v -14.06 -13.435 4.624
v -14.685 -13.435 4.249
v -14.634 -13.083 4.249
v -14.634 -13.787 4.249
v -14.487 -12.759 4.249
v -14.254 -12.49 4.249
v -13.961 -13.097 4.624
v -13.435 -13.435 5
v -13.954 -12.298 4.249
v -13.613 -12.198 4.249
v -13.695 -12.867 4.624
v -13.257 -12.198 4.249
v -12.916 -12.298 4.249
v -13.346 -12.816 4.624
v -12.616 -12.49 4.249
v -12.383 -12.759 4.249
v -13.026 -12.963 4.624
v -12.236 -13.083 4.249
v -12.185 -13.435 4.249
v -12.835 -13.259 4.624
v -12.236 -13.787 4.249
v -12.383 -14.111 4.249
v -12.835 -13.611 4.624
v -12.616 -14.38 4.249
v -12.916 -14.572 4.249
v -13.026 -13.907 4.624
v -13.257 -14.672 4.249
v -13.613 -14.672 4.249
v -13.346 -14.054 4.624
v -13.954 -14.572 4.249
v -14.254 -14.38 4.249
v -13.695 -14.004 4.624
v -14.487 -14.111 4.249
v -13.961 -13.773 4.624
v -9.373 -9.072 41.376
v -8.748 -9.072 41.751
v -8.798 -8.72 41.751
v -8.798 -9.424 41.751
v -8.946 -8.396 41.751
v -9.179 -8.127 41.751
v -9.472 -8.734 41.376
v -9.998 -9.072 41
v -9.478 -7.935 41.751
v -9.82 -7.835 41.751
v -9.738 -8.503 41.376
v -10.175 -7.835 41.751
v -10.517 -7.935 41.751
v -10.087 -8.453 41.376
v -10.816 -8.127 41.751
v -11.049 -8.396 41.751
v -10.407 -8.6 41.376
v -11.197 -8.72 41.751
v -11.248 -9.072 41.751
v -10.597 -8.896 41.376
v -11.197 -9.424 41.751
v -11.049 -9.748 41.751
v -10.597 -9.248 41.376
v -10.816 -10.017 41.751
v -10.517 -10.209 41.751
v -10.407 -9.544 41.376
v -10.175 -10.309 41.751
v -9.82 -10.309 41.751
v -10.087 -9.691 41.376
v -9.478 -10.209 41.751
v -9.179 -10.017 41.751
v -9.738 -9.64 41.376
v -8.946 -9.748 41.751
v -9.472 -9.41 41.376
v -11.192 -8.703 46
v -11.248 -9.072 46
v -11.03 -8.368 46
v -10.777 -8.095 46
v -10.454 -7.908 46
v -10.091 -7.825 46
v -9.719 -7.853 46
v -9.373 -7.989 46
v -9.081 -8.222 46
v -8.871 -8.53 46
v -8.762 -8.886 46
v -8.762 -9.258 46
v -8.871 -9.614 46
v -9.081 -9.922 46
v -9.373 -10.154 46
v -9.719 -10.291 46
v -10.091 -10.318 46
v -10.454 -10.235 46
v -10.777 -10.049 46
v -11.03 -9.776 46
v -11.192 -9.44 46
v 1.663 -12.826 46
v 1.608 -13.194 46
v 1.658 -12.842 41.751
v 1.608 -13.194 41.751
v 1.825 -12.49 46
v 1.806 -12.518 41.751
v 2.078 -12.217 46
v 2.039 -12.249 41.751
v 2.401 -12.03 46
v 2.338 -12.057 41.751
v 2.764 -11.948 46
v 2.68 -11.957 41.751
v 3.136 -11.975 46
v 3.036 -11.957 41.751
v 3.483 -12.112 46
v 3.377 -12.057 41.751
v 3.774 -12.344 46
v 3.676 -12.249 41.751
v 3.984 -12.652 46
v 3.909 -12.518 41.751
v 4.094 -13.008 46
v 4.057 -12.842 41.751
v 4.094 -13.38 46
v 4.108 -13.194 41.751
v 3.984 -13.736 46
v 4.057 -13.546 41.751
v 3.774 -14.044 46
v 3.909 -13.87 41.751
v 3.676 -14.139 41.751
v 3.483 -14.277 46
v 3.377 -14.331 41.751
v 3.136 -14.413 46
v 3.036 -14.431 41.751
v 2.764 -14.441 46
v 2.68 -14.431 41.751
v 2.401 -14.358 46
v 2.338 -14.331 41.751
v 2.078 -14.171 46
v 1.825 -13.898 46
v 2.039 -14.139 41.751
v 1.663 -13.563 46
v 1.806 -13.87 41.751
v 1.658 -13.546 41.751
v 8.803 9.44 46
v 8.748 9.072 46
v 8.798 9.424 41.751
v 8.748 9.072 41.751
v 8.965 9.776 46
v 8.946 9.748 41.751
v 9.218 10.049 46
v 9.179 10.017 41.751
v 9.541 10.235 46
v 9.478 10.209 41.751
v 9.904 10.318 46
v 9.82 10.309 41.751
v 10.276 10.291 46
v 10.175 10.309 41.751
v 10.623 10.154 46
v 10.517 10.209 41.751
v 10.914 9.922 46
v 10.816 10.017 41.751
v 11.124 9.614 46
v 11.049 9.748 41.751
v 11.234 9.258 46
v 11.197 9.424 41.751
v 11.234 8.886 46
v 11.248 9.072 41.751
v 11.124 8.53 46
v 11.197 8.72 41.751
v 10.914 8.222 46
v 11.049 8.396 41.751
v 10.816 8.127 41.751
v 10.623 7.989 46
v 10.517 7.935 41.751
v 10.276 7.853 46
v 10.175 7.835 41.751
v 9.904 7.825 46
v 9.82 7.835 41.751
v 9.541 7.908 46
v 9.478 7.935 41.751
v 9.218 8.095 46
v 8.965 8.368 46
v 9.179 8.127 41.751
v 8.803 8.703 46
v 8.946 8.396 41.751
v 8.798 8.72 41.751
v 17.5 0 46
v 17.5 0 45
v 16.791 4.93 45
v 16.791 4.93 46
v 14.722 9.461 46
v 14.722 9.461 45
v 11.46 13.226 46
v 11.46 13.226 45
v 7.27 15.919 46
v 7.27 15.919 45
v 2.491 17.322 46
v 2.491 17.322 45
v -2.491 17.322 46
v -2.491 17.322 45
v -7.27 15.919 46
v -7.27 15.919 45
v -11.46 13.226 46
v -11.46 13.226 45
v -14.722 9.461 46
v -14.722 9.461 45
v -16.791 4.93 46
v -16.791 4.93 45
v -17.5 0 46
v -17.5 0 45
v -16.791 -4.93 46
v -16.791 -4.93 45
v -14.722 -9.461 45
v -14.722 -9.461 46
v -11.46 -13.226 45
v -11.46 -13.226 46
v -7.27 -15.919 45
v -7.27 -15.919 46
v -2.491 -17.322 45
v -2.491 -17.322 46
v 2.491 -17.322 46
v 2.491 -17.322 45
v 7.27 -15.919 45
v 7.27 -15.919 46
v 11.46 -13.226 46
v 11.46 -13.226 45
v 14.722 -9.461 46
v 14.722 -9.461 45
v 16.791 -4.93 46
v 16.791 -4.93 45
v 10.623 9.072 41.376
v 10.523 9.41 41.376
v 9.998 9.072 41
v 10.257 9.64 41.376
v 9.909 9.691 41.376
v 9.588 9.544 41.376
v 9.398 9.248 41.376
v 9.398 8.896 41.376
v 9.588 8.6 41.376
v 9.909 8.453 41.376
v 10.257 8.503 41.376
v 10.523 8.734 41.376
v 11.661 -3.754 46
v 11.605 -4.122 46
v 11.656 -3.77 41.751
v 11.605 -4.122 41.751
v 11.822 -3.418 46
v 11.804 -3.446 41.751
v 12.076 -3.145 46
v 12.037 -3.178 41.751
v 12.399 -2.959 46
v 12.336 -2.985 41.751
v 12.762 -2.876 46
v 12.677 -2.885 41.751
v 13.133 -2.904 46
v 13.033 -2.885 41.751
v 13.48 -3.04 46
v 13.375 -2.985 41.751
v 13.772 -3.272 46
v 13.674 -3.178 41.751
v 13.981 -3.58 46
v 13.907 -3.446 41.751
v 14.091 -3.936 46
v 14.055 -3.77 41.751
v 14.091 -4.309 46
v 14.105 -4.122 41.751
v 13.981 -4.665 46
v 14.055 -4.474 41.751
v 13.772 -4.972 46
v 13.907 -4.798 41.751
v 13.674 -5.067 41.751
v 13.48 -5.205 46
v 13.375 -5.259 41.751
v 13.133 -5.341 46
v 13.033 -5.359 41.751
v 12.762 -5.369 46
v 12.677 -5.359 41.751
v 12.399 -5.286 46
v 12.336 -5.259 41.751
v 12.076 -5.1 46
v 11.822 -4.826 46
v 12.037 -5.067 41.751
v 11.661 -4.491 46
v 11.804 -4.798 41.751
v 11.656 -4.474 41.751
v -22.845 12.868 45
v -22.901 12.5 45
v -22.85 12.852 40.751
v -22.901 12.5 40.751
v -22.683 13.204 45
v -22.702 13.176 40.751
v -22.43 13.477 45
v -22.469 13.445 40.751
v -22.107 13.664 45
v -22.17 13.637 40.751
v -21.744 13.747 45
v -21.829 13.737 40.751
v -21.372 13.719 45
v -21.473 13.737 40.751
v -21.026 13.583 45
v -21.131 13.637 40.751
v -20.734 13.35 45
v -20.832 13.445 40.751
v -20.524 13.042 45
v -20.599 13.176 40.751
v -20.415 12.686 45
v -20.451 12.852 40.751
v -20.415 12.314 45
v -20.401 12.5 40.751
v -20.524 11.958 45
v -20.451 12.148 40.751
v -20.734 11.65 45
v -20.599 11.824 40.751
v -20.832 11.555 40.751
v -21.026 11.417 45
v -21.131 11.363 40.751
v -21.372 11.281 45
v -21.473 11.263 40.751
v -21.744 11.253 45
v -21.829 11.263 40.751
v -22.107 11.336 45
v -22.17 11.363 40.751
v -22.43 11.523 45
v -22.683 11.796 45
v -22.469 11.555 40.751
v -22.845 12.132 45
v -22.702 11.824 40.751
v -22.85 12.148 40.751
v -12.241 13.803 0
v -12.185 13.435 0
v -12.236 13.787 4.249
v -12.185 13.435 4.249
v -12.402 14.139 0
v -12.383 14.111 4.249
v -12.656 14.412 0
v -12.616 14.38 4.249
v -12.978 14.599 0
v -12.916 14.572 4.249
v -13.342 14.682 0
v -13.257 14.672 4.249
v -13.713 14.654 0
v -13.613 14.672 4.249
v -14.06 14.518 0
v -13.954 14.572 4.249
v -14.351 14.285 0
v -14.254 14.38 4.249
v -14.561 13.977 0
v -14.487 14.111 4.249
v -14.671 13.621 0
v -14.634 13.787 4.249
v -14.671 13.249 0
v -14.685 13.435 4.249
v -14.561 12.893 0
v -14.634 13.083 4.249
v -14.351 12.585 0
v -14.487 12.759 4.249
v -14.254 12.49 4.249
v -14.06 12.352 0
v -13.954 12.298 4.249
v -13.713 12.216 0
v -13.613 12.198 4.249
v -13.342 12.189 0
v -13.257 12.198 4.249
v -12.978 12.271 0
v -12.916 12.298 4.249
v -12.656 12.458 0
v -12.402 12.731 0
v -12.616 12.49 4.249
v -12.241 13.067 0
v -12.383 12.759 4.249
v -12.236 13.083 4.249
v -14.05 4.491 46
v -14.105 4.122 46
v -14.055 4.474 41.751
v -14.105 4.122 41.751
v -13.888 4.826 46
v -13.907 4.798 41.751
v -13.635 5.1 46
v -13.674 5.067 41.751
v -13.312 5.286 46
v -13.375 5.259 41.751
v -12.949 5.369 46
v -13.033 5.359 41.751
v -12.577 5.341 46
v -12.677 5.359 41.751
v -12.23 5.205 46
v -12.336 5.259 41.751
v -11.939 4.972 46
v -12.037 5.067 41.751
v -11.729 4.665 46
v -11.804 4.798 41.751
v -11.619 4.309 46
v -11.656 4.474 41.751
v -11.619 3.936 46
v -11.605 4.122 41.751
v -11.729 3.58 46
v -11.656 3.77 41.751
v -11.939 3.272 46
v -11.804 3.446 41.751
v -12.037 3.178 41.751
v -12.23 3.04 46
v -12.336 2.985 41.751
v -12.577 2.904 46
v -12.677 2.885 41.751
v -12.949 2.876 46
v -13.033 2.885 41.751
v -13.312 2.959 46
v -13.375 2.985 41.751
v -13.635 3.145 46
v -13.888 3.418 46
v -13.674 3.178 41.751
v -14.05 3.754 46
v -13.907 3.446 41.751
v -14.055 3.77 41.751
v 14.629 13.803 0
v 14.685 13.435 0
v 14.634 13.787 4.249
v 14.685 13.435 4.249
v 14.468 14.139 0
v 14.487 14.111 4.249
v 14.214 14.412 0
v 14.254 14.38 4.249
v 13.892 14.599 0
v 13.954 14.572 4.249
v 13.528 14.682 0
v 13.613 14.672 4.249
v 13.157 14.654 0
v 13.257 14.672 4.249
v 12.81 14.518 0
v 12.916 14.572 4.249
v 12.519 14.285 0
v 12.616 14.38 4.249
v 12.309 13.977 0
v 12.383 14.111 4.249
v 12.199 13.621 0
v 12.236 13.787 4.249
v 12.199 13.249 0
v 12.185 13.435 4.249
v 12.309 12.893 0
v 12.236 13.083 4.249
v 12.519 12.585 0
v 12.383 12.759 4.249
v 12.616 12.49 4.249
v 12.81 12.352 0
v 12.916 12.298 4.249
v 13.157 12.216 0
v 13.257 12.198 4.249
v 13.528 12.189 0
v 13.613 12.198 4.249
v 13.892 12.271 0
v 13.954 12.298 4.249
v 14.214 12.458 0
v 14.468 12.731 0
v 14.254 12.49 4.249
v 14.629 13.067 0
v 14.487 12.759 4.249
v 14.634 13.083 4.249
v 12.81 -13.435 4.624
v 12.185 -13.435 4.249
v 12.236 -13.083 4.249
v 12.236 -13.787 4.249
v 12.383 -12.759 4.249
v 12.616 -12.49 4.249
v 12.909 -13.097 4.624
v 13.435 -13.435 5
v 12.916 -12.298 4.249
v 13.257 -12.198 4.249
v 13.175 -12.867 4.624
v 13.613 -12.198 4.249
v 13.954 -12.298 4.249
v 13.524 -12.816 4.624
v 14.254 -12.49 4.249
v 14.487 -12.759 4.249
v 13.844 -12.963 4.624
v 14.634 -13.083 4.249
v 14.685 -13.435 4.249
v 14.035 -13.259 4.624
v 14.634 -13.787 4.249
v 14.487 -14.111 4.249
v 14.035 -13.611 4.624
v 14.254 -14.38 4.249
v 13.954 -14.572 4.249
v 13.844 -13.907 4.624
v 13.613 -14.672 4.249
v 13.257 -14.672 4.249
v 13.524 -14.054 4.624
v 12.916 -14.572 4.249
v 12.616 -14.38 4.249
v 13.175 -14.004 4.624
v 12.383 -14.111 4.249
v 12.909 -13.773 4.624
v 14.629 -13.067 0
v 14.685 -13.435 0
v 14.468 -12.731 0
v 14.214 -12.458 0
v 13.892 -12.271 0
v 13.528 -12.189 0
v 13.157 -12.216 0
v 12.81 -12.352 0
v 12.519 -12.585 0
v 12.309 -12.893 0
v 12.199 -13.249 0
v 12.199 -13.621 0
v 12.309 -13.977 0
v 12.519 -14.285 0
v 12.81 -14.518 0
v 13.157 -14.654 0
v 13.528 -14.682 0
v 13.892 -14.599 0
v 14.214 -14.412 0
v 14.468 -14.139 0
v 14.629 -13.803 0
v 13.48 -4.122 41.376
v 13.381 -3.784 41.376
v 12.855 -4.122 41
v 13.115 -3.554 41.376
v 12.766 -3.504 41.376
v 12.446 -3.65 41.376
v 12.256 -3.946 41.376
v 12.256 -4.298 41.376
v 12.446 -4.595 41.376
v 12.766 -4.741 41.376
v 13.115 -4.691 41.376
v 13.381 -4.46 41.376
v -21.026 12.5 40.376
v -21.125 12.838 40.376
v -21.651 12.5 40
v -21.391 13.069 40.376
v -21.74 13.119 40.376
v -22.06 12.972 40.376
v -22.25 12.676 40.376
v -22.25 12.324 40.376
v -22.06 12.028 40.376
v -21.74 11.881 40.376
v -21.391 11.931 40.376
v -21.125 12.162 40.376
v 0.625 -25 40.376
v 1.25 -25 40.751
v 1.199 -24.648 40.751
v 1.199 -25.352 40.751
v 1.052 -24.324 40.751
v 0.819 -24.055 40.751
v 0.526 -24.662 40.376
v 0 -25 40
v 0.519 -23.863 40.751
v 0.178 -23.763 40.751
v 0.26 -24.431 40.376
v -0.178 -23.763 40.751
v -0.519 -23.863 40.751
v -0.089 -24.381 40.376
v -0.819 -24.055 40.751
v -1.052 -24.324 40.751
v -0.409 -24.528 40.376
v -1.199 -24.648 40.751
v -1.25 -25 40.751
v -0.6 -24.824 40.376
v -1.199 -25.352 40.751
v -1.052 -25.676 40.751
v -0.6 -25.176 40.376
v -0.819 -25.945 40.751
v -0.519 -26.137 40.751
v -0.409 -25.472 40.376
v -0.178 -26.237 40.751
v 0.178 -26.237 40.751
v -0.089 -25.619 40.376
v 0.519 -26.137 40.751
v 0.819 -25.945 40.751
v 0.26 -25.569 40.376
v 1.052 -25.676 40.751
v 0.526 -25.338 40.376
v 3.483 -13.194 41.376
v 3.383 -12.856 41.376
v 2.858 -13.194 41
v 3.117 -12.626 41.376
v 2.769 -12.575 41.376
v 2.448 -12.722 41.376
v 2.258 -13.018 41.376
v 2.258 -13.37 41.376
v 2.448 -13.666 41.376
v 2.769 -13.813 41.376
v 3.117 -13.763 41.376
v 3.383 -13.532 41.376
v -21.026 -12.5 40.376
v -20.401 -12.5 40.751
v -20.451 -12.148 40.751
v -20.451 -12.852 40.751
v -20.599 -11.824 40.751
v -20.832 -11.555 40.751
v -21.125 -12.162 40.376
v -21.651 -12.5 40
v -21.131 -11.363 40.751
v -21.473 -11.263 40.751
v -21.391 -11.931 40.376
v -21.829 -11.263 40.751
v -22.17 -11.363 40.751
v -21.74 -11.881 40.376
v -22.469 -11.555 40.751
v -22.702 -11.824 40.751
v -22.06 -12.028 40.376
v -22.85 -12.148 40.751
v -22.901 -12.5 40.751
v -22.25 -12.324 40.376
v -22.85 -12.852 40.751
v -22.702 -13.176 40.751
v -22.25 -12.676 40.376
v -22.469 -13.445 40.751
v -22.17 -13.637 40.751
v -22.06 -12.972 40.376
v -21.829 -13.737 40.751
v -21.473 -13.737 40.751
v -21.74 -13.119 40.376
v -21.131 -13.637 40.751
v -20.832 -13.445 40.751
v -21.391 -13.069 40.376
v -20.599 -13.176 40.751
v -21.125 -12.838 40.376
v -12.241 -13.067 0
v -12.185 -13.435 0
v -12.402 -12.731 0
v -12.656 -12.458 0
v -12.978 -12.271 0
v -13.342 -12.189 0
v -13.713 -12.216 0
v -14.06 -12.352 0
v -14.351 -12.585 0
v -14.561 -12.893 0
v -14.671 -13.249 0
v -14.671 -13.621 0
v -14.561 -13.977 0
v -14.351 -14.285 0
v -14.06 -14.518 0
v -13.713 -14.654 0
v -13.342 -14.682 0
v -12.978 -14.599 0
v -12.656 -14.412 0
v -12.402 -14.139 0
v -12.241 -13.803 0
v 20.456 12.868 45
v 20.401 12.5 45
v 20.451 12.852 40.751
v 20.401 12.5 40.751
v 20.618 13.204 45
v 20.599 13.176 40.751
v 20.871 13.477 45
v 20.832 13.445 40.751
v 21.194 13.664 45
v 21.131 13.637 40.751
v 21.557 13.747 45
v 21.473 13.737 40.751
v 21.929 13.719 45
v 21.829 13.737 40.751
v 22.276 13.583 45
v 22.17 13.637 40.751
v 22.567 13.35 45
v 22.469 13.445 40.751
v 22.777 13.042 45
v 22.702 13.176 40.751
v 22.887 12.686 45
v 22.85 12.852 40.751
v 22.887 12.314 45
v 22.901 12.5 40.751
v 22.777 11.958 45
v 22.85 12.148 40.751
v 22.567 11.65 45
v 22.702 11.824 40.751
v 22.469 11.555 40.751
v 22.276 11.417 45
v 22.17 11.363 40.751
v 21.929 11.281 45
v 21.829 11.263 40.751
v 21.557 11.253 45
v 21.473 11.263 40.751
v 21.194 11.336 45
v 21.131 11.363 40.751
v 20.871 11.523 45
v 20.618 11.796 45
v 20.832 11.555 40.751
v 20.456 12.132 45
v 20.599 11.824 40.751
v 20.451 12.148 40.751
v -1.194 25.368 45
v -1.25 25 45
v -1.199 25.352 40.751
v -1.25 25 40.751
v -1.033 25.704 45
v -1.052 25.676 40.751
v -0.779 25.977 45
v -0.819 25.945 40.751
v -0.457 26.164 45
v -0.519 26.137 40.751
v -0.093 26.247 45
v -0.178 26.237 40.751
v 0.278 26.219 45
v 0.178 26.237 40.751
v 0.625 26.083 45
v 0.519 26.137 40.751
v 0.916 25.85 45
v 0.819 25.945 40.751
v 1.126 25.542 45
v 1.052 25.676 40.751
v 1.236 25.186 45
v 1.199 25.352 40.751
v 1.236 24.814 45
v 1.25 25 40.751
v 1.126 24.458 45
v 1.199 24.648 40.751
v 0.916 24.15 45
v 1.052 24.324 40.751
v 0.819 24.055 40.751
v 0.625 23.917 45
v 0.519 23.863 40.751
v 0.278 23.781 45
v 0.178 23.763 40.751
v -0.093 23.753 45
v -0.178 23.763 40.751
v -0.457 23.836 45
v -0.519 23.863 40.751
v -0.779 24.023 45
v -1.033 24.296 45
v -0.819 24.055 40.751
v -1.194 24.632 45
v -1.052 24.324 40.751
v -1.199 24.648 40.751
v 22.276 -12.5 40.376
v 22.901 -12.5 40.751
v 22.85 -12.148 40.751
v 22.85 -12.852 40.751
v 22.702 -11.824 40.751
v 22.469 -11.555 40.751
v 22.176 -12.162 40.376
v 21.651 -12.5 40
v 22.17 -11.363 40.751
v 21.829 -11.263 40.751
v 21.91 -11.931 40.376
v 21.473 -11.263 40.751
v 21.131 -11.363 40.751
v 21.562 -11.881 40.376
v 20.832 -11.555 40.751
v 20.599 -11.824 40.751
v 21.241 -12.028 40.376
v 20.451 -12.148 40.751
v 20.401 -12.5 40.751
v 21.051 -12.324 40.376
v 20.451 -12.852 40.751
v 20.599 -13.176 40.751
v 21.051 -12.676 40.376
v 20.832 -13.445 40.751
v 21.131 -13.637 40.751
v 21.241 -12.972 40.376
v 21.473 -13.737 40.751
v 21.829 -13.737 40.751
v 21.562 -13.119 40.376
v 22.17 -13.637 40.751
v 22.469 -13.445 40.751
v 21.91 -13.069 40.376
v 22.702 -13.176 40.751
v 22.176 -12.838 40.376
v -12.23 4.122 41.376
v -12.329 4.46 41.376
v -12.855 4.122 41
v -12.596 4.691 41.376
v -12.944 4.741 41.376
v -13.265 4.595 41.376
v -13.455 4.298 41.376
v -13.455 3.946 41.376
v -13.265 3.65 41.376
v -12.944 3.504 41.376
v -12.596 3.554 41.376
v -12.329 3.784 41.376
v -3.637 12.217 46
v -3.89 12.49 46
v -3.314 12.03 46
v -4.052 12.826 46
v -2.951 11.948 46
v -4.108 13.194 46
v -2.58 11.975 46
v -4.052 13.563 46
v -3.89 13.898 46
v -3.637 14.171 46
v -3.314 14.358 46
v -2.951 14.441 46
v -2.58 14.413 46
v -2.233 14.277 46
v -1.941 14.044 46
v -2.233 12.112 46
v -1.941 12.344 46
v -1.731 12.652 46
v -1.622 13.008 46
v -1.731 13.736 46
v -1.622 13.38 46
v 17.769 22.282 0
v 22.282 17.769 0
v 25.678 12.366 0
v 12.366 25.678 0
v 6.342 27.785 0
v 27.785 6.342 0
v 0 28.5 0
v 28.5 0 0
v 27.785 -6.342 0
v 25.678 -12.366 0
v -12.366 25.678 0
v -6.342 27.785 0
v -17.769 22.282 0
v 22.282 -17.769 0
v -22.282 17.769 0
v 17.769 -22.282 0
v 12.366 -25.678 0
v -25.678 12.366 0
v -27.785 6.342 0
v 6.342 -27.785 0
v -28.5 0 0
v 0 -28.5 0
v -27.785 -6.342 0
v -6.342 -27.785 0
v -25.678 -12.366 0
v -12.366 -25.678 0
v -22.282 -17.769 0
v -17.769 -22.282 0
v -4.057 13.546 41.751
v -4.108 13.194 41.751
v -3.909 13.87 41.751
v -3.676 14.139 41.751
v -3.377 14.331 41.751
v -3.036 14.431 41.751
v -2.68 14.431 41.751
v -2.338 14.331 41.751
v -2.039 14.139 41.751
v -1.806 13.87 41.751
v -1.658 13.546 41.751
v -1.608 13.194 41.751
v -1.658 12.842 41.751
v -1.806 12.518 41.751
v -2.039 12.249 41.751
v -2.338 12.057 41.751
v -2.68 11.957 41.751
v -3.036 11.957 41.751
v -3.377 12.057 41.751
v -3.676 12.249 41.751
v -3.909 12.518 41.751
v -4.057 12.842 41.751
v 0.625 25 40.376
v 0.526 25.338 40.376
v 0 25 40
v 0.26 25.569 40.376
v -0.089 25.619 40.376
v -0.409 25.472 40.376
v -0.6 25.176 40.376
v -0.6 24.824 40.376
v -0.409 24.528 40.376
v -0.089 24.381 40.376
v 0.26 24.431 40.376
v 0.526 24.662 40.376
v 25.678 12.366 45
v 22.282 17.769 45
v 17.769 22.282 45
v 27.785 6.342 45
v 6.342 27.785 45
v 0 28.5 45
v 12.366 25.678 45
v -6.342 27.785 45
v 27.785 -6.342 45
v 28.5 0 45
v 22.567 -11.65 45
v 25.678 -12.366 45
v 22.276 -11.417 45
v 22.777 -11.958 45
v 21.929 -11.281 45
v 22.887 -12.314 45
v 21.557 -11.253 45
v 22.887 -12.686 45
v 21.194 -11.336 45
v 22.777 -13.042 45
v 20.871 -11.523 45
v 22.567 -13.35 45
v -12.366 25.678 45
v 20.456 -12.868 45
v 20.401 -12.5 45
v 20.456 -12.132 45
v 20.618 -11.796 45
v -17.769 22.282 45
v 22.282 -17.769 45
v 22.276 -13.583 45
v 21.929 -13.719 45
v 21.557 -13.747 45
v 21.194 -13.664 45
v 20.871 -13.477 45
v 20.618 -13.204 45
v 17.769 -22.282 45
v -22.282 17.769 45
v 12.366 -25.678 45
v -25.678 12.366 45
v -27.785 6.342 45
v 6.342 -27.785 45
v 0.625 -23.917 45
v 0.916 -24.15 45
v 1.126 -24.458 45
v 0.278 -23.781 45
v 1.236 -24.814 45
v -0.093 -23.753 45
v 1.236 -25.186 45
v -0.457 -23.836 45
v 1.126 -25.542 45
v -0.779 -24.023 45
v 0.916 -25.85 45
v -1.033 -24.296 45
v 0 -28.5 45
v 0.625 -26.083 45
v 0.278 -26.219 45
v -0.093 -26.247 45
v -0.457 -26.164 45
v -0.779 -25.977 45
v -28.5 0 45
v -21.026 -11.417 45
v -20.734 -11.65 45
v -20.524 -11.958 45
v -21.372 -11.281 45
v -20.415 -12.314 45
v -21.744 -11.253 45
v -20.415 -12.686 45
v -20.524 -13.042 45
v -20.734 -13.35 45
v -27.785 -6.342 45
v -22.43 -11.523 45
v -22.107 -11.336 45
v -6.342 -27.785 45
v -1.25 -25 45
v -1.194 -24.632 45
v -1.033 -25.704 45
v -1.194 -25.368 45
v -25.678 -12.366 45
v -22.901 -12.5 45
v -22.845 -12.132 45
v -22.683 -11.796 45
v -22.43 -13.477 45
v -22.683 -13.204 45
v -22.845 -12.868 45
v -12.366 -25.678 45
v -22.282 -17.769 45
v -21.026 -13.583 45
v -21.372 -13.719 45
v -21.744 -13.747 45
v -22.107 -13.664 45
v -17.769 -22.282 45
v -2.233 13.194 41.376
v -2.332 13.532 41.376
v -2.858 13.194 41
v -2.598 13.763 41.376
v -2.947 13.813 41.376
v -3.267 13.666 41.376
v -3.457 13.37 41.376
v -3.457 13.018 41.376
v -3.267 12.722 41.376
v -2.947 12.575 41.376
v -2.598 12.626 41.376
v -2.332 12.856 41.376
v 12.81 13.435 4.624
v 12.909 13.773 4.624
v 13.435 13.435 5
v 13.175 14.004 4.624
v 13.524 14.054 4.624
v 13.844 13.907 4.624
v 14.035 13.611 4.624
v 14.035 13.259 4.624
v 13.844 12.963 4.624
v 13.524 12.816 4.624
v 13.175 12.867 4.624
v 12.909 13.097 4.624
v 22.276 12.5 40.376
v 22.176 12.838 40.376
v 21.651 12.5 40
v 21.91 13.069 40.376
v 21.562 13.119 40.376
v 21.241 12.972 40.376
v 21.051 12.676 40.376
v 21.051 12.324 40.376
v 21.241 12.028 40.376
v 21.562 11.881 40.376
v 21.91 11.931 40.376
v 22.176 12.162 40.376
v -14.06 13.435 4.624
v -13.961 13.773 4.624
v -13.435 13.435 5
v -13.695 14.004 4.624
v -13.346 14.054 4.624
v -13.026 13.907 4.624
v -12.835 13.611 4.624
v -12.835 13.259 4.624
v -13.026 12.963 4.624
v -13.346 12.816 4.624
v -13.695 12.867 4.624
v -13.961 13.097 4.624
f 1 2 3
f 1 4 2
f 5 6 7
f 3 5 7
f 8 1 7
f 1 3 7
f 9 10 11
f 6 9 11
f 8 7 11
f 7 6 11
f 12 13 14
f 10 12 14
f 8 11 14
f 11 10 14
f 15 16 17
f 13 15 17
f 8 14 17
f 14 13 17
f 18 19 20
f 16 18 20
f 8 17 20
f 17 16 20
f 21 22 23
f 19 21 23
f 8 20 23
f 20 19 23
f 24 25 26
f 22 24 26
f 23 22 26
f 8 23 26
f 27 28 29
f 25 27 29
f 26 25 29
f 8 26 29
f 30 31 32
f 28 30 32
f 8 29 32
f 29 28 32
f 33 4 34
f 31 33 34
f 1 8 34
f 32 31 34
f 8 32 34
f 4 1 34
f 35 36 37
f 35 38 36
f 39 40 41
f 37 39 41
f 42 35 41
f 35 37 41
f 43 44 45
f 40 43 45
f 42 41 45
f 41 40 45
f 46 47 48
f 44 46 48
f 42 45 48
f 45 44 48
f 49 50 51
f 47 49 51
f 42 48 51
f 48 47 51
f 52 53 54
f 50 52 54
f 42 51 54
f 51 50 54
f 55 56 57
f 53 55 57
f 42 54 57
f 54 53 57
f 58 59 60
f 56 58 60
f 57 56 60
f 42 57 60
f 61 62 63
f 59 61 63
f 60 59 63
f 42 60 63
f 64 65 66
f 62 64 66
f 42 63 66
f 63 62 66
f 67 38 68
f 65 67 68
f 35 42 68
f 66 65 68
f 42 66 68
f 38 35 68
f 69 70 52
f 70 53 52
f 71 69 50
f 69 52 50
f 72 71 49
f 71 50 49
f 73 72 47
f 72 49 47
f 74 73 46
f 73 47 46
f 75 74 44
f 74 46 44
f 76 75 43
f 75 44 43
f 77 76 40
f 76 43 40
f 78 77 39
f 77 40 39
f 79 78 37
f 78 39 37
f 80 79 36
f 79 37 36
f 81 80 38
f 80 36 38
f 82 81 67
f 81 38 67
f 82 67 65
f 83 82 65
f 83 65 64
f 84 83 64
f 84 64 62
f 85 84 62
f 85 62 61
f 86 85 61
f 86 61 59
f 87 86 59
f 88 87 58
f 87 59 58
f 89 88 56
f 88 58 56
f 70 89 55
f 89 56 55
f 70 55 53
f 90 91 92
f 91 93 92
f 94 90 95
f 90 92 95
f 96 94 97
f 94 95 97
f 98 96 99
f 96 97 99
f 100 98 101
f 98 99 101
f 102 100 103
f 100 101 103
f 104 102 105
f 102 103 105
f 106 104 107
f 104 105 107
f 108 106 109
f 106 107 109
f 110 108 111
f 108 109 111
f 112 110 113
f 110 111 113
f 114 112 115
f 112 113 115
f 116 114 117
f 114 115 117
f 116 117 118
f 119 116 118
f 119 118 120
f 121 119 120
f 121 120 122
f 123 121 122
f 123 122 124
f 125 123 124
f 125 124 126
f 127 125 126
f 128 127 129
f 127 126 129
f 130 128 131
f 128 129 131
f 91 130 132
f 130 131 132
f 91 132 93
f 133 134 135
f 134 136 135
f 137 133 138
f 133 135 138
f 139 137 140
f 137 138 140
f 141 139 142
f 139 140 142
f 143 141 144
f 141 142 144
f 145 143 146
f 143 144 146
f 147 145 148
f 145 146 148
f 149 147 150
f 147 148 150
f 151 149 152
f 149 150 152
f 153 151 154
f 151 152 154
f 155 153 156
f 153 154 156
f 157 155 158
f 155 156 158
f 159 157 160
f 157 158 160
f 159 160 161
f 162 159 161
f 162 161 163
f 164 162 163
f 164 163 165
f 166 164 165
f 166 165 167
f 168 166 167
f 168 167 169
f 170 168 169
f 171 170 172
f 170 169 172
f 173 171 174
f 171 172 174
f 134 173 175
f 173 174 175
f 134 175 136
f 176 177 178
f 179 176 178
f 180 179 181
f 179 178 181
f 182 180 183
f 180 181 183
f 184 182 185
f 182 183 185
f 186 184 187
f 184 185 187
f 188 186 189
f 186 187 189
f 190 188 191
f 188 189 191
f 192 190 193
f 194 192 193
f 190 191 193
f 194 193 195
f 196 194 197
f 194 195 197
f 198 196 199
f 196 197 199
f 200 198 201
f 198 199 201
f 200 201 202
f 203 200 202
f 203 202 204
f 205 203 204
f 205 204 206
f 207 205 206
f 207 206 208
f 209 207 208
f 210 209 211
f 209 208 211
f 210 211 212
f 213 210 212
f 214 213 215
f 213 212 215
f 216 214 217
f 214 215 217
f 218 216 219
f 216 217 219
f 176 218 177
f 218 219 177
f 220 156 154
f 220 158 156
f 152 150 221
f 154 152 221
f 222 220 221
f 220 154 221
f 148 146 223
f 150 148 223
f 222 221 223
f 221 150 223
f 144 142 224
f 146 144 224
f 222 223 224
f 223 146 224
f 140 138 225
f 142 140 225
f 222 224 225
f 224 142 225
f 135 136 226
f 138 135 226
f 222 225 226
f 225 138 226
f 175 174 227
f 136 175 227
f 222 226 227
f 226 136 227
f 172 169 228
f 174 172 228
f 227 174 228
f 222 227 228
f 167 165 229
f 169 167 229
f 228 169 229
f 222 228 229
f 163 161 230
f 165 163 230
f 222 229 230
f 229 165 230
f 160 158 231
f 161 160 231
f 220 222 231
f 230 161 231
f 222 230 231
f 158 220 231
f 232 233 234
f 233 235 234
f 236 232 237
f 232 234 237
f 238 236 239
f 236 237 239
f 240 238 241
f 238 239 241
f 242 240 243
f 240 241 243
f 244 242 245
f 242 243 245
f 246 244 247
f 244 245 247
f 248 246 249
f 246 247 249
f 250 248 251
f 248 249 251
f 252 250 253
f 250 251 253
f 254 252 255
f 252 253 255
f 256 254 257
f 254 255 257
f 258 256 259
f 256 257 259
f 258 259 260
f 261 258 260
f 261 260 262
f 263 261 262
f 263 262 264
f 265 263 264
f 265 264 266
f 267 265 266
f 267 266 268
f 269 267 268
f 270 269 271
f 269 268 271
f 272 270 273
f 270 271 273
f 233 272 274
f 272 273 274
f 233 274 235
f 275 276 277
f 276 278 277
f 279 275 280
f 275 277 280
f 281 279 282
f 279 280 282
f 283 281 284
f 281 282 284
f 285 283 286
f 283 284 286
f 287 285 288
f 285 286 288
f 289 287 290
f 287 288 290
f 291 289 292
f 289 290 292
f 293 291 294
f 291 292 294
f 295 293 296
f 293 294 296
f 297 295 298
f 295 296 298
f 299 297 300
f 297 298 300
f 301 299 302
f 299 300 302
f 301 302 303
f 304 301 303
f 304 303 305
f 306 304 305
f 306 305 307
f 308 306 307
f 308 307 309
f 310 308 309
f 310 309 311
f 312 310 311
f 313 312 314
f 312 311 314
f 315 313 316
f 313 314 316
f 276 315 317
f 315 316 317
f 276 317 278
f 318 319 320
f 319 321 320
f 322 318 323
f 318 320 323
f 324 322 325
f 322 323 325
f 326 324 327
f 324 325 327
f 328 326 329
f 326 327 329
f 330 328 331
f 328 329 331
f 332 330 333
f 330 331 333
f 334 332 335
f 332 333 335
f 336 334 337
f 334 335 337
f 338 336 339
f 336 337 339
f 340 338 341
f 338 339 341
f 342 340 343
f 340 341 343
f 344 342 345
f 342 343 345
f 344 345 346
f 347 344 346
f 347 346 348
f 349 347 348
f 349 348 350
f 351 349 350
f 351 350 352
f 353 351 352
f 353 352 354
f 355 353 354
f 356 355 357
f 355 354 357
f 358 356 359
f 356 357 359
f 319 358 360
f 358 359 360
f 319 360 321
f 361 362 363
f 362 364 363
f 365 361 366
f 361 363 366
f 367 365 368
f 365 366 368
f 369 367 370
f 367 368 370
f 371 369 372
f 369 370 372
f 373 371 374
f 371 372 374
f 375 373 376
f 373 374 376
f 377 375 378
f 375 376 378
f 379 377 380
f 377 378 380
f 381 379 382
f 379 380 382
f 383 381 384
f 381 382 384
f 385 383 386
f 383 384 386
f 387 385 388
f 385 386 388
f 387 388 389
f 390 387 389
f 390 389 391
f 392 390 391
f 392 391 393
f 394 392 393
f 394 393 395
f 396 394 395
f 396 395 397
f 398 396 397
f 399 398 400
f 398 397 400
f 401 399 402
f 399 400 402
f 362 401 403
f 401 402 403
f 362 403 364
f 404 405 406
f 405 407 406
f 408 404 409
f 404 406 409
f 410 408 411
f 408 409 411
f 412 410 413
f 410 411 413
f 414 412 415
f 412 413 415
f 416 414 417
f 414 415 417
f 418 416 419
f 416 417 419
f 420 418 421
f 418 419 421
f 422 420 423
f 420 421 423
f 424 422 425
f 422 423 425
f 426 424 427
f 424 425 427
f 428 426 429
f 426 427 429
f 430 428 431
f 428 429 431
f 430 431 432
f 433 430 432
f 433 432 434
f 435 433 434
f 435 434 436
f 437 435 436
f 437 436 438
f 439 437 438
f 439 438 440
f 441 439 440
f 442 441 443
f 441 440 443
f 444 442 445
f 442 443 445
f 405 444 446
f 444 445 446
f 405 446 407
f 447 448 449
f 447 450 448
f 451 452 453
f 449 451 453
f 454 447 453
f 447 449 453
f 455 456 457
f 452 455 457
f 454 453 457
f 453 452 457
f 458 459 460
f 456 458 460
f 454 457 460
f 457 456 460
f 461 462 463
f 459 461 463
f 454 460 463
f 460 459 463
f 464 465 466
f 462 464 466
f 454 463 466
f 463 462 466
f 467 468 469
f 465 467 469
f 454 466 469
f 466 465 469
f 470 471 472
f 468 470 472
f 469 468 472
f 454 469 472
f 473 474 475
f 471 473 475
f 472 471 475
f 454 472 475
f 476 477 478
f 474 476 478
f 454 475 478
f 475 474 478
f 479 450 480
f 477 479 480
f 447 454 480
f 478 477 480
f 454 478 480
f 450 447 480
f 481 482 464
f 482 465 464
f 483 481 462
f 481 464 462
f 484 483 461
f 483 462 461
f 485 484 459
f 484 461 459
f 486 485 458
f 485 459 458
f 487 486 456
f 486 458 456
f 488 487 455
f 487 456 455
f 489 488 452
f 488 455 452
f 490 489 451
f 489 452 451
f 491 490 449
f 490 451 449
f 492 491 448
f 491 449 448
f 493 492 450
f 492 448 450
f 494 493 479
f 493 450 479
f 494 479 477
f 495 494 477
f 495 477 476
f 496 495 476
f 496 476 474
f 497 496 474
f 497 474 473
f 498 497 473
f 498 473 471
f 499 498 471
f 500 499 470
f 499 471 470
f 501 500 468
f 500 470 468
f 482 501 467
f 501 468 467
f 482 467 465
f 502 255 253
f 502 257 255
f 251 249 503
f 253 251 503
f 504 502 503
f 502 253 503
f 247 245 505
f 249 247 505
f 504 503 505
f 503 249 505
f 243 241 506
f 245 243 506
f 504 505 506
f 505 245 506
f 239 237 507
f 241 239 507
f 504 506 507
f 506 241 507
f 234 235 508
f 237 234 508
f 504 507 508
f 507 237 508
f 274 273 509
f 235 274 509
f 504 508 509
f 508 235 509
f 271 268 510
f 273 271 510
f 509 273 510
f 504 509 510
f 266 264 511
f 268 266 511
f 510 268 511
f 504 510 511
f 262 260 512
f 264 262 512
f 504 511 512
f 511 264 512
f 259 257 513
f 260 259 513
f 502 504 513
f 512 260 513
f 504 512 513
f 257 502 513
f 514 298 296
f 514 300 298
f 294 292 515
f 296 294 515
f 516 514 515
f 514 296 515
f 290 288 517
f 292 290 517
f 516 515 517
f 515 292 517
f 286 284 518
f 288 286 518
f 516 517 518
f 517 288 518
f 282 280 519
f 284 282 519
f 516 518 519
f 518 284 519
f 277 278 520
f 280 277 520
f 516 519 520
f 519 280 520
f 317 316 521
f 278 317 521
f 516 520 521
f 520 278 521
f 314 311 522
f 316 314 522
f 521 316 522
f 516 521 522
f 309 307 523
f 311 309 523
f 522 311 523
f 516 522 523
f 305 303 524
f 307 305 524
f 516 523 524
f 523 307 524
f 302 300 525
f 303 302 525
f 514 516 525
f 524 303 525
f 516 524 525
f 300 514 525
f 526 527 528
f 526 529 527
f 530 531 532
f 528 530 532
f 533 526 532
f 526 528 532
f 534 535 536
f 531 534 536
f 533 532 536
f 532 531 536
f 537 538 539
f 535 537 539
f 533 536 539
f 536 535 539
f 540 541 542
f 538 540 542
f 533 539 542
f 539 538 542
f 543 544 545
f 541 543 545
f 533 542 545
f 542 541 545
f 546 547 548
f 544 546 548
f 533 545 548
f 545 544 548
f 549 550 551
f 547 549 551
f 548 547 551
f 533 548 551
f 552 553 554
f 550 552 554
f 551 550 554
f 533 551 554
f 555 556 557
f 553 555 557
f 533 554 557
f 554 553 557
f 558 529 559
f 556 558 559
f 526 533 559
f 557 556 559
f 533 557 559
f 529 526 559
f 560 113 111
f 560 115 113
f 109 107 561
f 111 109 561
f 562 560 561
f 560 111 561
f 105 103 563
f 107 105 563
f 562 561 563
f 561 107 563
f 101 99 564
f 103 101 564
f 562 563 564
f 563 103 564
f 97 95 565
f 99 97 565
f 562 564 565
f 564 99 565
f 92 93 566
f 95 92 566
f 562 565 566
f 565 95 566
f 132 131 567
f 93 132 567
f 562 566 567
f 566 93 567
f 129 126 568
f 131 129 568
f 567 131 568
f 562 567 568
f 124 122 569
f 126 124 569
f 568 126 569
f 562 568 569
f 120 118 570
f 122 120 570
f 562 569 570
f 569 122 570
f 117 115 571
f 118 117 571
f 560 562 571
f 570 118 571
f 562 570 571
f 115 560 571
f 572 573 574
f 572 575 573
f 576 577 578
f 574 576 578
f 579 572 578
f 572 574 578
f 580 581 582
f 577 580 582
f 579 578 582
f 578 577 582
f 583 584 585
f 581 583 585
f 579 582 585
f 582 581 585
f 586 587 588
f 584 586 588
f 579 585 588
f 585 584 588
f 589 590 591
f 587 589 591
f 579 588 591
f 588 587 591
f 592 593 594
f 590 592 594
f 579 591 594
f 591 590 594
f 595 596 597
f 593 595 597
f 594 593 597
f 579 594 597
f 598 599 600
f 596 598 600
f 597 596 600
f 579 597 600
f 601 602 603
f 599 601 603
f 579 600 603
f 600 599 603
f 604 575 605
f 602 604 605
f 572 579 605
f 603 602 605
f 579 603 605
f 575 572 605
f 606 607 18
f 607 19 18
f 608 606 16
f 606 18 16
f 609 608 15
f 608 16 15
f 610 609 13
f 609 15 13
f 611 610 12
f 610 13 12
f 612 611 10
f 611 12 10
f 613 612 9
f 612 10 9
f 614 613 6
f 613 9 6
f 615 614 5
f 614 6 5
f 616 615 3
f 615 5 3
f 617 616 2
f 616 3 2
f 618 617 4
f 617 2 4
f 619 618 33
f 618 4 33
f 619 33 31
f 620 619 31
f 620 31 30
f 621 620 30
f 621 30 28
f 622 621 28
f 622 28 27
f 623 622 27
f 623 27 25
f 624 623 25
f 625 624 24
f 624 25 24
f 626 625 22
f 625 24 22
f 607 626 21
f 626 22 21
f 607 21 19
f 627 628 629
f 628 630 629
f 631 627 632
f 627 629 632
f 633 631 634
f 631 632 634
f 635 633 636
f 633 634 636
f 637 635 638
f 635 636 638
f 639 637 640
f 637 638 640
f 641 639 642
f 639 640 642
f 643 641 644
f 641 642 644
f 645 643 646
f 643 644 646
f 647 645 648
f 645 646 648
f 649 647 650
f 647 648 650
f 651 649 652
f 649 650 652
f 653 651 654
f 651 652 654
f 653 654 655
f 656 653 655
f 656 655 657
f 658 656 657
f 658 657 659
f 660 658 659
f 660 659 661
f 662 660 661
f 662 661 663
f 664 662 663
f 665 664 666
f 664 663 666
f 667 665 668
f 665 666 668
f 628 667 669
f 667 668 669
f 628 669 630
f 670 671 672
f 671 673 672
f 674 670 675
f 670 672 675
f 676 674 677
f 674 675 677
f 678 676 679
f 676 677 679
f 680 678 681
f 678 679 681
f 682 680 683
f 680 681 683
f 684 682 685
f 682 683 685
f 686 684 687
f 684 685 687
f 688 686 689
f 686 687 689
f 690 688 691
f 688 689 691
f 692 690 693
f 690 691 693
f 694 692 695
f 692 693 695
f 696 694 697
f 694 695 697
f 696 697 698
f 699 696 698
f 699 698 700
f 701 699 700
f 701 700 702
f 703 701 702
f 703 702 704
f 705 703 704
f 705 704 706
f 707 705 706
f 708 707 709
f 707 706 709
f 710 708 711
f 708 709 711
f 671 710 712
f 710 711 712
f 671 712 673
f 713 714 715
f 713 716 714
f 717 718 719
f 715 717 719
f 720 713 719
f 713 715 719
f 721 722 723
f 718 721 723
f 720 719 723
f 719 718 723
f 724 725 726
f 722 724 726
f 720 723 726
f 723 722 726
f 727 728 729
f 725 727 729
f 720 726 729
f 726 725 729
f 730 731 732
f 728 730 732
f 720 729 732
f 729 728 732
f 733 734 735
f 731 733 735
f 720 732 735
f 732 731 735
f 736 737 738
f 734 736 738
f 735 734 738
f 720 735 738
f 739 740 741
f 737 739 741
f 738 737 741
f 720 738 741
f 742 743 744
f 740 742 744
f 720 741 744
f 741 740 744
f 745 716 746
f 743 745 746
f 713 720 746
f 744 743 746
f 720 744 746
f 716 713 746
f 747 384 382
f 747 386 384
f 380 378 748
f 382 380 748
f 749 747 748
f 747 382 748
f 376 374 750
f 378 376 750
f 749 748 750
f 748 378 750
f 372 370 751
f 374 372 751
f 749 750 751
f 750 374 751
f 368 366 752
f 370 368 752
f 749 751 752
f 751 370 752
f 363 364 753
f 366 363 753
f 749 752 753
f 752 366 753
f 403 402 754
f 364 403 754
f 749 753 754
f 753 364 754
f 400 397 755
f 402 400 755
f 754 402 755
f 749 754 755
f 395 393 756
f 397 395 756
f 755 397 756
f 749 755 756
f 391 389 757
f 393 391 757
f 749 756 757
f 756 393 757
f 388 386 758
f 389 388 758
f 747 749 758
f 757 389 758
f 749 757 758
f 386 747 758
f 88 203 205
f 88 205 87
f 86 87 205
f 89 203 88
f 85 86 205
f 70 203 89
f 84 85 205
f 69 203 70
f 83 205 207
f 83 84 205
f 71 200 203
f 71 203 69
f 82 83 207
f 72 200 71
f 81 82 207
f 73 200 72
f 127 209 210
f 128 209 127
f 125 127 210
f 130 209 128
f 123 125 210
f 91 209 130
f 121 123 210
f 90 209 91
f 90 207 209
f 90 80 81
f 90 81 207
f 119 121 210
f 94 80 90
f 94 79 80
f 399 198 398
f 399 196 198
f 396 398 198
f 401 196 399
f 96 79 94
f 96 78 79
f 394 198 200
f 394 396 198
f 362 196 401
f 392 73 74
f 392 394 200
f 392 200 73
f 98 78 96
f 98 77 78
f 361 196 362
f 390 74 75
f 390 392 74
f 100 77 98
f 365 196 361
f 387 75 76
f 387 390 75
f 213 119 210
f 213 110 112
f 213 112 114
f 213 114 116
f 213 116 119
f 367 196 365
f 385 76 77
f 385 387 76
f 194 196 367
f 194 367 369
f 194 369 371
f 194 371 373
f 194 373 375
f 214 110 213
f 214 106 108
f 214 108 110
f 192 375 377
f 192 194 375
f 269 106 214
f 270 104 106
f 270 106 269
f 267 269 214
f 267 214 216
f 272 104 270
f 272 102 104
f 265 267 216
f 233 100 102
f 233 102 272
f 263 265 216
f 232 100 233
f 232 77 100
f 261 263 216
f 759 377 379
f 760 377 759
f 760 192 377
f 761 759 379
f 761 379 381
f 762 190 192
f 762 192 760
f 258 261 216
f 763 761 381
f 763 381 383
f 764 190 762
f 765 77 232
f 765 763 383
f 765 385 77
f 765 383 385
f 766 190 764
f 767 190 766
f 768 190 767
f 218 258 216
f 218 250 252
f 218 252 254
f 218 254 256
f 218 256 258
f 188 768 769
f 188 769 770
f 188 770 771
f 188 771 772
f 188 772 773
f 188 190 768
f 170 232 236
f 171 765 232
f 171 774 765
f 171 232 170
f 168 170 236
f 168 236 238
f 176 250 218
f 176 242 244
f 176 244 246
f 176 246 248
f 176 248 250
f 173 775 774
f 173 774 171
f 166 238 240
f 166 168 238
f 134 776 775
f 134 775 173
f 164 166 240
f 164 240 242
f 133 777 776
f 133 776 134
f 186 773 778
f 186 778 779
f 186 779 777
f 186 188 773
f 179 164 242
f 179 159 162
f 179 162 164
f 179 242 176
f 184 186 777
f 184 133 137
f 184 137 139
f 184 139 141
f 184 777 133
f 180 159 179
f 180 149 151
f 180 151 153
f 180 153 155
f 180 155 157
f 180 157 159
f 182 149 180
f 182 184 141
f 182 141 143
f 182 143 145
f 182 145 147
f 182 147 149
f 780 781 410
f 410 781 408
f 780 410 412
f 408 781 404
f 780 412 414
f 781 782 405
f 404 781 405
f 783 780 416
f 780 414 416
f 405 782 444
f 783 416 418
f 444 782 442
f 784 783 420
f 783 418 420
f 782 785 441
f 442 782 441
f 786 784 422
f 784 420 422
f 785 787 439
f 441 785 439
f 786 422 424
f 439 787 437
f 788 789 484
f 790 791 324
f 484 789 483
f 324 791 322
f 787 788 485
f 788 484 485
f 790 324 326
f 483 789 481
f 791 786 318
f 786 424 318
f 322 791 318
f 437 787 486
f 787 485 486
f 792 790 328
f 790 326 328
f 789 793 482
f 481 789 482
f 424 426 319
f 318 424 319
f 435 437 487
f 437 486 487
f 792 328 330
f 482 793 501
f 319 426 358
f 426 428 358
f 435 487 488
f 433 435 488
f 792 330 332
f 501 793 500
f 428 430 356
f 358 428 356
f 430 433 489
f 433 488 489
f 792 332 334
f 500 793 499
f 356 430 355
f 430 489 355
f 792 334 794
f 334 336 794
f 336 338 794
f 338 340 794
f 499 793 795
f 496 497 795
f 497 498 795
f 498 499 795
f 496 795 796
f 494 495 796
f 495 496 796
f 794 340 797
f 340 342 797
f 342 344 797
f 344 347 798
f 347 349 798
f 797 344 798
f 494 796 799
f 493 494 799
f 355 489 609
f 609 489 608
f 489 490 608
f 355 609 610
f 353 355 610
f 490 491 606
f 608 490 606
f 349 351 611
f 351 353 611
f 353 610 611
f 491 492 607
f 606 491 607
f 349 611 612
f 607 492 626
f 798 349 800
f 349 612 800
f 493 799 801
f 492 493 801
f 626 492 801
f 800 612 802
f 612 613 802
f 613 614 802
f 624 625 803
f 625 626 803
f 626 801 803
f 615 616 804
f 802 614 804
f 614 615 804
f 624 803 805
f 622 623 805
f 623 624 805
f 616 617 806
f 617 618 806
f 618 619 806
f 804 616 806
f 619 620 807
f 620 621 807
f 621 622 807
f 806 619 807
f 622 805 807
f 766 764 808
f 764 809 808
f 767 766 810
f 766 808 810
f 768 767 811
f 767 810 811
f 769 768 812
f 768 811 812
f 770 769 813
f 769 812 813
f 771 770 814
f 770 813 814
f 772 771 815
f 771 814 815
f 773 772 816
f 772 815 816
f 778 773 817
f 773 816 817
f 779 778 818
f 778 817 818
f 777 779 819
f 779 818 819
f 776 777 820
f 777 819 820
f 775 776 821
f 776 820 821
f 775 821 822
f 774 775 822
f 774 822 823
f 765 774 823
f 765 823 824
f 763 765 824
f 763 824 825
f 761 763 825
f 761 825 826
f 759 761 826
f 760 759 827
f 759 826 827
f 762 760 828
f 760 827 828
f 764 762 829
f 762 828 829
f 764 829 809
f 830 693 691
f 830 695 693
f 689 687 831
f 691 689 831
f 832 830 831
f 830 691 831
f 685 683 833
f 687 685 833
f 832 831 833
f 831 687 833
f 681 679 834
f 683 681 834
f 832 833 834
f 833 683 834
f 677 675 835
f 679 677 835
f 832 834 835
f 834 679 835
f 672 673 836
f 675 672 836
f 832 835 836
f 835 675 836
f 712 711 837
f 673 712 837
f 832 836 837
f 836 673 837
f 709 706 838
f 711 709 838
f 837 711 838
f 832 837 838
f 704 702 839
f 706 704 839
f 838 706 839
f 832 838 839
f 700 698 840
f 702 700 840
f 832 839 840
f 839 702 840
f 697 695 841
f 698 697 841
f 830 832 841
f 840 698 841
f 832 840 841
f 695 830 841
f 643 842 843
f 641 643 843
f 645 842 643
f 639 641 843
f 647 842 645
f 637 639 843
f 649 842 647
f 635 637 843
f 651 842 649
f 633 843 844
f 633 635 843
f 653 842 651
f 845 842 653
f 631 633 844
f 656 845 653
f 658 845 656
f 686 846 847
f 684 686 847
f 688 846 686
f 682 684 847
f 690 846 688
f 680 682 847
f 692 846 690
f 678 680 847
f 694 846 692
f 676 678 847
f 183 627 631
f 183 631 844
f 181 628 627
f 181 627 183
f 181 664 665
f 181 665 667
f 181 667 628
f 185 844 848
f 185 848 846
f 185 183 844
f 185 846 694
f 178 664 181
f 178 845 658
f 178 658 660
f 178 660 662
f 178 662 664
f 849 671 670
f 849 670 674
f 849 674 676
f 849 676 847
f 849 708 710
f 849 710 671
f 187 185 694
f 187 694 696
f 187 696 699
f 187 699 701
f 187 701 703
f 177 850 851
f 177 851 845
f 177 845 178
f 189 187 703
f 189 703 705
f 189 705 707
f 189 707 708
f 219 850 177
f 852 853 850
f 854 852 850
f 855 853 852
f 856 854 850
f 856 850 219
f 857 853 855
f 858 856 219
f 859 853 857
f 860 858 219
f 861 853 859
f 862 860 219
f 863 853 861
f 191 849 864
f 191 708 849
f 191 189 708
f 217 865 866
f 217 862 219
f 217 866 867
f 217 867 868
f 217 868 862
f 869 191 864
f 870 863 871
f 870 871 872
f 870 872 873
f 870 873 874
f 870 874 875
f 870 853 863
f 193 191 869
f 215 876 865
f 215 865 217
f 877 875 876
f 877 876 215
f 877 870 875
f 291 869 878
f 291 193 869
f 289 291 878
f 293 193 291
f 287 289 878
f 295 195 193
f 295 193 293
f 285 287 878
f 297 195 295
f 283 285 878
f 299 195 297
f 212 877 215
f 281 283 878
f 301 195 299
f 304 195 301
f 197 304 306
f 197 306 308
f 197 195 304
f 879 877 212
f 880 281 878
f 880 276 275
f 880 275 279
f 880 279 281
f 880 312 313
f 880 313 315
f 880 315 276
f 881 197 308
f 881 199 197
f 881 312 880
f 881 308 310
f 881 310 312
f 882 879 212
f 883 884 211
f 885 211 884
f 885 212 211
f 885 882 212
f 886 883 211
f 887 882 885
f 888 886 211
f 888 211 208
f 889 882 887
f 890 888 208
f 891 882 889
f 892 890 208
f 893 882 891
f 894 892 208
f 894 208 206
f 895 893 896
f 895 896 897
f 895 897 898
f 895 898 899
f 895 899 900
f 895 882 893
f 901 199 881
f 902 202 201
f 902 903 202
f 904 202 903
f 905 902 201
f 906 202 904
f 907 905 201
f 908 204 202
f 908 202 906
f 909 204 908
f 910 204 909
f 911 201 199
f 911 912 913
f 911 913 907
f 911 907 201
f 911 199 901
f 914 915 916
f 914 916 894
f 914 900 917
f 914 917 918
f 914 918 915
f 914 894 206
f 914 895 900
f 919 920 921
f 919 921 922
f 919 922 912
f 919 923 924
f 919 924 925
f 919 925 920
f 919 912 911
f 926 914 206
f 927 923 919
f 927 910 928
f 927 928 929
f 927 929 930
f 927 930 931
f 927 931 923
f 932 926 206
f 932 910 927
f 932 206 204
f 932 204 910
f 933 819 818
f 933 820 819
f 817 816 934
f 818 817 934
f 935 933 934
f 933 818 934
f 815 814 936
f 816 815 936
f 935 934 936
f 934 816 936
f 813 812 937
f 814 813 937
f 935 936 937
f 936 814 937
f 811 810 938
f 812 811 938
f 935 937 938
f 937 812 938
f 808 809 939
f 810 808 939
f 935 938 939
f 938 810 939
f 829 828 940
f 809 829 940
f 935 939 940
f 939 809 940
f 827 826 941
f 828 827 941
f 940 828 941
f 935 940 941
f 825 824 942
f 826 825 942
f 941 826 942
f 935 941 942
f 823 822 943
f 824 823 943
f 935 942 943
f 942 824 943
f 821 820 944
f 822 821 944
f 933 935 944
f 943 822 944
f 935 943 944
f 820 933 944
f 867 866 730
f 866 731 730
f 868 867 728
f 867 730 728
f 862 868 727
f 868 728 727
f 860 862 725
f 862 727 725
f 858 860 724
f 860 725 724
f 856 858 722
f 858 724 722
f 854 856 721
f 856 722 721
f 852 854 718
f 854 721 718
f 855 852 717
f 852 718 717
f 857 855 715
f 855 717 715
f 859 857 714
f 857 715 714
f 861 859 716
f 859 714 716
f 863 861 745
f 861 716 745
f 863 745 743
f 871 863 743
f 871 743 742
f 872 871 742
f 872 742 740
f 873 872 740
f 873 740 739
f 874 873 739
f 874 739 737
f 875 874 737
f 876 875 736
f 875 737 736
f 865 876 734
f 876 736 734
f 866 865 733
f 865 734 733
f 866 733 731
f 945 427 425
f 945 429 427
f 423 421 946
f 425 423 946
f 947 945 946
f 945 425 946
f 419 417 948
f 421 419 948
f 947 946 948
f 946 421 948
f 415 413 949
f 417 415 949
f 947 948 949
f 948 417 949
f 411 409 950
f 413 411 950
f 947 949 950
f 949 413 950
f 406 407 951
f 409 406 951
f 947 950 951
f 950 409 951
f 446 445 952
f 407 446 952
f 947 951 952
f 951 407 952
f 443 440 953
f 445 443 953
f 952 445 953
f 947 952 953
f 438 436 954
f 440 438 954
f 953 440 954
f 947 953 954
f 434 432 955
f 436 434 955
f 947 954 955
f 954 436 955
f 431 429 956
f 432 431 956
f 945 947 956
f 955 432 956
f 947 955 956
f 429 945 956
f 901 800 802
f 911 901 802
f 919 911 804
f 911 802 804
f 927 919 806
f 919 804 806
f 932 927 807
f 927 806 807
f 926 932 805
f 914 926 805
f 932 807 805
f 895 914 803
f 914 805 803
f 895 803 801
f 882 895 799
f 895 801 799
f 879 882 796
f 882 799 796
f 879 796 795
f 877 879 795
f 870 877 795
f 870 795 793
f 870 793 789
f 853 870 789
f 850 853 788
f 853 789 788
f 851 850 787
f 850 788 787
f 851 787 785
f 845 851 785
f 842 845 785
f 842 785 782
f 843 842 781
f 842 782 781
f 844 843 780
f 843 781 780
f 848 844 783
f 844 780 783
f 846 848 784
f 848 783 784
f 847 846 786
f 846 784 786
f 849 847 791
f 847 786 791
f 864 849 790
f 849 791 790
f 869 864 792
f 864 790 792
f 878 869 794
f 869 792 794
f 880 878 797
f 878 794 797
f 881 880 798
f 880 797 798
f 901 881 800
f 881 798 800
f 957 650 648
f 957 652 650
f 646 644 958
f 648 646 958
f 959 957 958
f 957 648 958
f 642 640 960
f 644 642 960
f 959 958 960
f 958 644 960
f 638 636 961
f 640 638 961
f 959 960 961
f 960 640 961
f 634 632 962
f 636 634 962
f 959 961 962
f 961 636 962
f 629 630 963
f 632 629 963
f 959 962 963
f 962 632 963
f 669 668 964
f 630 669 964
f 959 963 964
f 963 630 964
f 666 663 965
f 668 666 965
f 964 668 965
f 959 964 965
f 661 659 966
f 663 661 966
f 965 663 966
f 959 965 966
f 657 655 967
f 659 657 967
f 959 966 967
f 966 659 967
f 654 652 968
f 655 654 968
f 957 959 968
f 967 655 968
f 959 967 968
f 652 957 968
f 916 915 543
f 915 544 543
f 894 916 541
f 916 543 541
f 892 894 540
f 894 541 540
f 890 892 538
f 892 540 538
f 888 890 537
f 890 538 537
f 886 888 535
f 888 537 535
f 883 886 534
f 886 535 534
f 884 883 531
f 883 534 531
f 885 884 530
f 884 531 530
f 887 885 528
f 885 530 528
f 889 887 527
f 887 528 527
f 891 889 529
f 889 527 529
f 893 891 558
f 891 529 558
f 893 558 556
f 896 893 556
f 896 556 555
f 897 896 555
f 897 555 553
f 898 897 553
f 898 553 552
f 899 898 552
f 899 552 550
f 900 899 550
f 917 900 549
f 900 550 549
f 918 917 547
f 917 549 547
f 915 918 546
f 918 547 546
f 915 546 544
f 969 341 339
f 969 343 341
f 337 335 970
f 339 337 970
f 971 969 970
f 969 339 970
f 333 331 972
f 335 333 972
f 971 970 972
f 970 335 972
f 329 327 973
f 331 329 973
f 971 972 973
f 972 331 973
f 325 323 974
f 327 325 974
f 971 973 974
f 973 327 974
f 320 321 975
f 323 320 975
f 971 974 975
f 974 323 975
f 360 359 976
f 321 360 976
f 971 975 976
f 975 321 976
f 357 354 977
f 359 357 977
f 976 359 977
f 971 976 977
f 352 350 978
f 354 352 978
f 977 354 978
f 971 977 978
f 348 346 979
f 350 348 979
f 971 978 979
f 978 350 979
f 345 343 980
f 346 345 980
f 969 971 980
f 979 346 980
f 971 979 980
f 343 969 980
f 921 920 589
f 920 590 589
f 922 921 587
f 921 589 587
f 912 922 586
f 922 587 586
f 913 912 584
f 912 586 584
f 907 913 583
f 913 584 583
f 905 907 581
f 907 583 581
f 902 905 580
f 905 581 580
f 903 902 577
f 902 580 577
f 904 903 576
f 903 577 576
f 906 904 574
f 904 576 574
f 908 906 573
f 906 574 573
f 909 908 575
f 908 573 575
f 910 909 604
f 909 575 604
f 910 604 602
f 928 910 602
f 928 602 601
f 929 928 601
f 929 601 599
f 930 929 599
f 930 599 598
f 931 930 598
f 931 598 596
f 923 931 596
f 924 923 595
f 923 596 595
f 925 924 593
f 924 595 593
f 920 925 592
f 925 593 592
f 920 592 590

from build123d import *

# Parameters (mm, degrees)
SKETCH_1_R      = 28.5
EXTRUDE_1_DEPTH = 45
SKETCH_2_R      = 17.5
EXTRUDE_2_DEPTH = 1
M3X0_5_1_D      = 2.5
M3X0_5_1_DEPTH  = 4.248924226
M3X0_5_1_TIP    = 0.751075774
M3X0_5_2_D      = 2.5
M3X0_5_2_DEPTH  = 4.248924226
M3X0_5_2_TIP    = 0.751075774
M3X0_5_3_D      = 2.5
M3X0_5_3_DEPTH  = 4.248924226
M3X0_5_3_TIP    = 0.751075774


with BuildPart() as part:
    # 草图1 → 凸台-拉伸1 (new body)
    with BuildSketch(Plane.XY):
        with Locations(Location((0, 0, 0), (0, 0, 180))):
            Circle(SKETCH_1_R)
    extrude(amount=EXTRUDE_1_DEPTH)

    # 草图2 → 凸台-拉伸2 (add)
    with BuildSketch(Plane.XY.offset(45)):
        Circle(SKETCH_2_R)
    extrude(amount=EXTRUDE_2_DEPTH)

    # M3x0.5 螺纹孔1
    with Locations(Plane(origin=(0, 25, 45), x_dir=(1, 0, 0), z_dir=(0, 0, 1))):
        with Locations((0, 0), (21.650635095, -12.5), (21.650635095, -37.5), (0, -50), (-21.650635095, -37.5), (-21.650635095, -12.5)):
            Hole(M3X0_5_1_D / 2, depth=M3X0_5_1_DEPTH)
            with Locations((0, 0, -(M3X0_5_1_DEPTH + M3X0_5_1_TIP / 2))):  # 118° drill point
                Cone(0, M3X0_5_1_D / 2, M3X0_5_1_TIP, mode=Mode.SUBTRACT)

    # M3x0.5 螺纹孔2
    with Locations(Plane(origin=(-2.857682397, 13.194076372, 46), x_dir=(1, 0, 0), z_dir=(0, 0, 1))):
        with Locations((0, 0), (12.855246516, -4.122212634), (15.712928913, -17.316289006), (5.715364794, -26.388152744), (-7.139881722, -22.26594011), (-9.997564119, -9.071863738)):
            Hole(M3X0_5_2_D / 2, depth=M3X0_5_2_DEPTH)
            with Locations((0, 0, -(M3X0_5_2_DEPTH + M3X0_5_2_TIP / 2))):  # 118° drill point
                Cone(0, M3X0_5_2_D / 2, M3X0_5_2_TIP, mode=Mode.SUBTRACT)

    # M3x0.5 螺纹孔3
    with Locations(Plane(origin=(13.435028843, 13.435028843, 0), x_dir=(-1, 0, 0), z_dir=(0, 0, -1))):
        with Locations((0, 0), (0, -26.870057686), (26.870057686, -26.870057686), (26.870057686, 0)):
            Hole(M3X0_5_3_D / 2, depth=M3X0_5_3_DEPTH)
            with Locations((0, 0, -(M3X0_5_3_DEPTH + M3X0_5_3_TIP / 2))):  # 118° drill point
                Cone(0, M3X0_5_3_D / 2, M3X0_5_3_TIP, mode=Mode.SUBTRACT)


solid = part.part
